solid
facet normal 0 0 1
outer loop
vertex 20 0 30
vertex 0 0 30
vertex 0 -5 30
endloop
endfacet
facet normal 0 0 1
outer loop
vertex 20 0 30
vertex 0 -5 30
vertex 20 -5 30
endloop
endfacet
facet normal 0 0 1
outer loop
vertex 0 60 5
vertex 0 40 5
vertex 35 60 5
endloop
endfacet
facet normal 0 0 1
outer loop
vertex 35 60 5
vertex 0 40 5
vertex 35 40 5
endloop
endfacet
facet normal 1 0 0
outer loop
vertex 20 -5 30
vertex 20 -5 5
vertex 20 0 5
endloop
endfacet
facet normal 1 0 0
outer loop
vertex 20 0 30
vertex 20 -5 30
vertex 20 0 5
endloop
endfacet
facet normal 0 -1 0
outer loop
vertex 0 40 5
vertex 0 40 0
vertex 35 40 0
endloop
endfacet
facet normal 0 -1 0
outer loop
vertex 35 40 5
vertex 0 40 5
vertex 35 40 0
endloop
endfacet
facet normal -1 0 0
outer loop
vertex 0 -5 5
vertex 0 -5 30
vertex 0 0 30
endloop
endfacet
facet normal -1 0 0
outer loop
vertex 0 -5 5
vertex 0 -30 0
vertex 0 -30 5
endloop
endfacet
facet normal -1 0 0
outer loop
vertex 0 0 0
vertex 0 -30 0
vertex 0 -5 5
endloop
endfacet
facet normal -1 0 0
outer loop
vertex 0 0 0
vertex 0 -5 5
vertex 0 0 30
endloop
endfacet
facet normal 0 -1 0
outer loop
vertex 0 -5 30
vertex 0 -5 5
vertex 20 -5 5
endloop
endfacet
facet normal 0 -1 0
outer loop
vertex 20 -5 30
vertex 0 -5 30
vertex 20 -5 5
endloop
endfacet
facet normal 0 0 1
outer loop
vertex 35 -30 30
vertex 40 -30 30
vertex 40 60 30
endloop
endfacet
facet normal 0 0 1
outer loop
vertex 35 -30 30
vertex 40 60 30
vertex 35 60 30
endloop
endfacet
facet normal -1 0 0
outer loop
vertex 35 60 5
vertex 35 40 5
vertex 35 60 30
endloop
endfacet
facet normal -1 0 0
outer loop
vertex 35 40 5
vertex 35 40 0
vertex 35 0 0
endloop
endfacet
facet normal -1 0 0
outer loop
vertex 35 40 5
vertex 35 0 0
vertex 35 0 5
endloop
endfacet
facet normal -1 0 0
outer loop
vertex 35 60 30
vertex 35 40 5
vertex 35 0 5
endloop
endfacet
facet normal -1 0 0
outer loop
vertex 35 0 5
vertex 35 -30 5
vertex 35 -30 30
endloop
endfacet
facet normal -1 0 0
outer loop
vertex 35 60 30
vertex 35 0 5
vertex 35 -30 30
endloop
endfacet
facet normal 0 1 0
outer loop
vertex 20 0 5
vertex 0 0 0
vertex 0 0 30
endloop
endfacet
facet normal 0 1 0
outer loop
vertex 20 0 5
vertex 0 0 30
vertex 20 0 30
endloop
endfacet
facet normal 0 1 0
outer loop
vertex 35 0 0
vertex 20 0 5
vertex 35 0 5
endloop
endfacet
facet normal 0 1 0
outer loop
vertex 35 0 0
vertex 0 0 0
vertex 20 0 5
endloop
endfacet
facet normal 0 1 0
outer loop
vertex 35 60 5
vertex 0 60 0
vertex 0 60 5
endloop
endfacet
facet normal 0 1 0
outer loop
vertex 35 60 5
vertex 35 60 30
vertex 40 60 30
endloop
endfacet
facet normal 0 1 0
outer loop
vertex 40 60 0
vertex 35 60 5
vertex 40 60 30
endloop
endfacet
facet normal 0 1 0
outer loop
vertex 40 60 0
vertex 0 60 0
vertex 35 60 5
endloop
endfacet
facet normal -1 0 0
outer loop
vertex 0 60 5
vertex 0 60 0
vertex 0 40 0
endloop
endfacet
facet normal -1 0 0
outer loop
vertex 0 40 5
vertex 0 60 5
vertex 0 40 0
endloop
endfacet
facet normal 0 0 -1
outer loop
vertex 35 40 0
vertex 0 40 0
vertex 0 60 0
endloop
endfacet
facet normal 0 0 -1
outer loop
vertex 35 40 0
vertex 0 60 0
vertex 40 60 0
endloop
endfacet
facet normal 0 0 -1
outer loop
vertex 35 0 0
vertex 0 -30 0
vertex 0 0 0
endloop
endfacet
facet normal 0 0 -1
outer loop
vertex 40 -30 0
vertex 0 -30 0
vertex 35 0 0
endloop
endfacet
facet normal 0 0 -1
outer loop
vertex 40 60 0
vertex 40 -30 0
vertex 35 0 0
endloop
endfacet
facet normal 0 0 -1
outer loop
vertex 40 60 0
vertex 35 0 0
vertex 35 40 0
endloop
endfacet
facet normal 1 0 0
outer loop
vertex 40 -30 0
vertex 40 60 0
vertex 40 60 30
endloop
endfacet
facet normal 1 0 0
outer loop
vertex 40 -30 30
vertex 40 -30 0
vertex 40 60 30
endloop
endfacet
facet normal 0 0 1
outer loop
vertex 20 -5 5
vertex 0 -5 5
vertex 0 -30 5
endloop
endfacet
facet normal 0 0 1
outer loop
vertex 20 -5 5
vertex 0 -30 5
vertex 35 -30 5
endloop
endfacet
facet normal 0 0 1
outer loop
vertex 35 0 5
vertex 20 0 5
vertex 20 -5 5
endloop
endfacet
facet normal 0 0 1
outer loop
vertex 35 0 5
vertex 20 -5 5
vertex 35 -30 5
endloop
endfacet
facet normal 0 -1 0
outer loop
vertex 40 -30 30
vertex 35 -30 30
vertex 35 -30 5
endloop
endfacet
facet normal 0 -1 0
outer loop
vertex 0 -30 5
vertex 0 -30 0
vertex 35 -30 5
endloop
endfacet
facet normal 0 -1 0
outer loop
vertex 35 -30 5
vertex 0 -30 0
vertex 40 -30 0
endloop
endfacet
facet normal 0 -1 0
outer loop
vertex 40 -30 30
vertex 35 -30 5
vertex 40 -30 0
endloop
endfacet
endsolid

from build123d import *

# Parameters (mm, degrees)
F0_W     = 40
F0_H     = 30
F1_DEPTH = 5
F2_W     = 20
F2_H     = 5
F3_DEPTH = 25
F4_W     = 5
F4_H     = 30
F5_DEPTH = 25
F6_W     = 5
F6_H     = 30
F7_DEPTH = 60
F8_W     = 35
F8_H     = 20
F9_DEPTH = 5


with BuildPart() as f1:
    # F0 (on Top) → F1 (new body)
    with BuildSketch(Plane.XY):
        with Locations((20, -15)):
            Rectangle(F0_W, F0_H)
    extrude(amount=F1_DEPTH)

    # F2 (on face) → F3 (join)
    with BuildSketch(Plane.XY.offset(5)):
        with Locations((10, -2.5)):
            Rectangle(F2_W, F2_H)
    extrude(amount=F3_DEPTH)

    # F4 (on face) → F5 (join)
    with BuildSketch(Plane.XY.offset(5)):
        with Locations((37.5, -15)):
            Rectangle(F4_W, F4_H)
    extrude(amount=F5_DEPTH)

    # F6 (on face) → F7 (join)
    with BuildSketch(Plane(origin=(0, 0, 0), x_dir=(-1, 0, 0), z_dir=(0, 1, 0))):
        with Locations((-37.5, 15)):
            Rectangle(F6_W, F6_H)
    extrude(amount=F7_DEPTH)

    # F8 (on face) → F9 (join)
    with BuildSketch(Plane(origin=(0, 0, 0), x_dir=(1, 0, 0), z_dir=(0, 0, -1))):
        with Locations((17.5, -50)):
            Rectangle(F8_W, F8_H)
    extrude(amount=-F9_DEPTH)


solid = f1.part
